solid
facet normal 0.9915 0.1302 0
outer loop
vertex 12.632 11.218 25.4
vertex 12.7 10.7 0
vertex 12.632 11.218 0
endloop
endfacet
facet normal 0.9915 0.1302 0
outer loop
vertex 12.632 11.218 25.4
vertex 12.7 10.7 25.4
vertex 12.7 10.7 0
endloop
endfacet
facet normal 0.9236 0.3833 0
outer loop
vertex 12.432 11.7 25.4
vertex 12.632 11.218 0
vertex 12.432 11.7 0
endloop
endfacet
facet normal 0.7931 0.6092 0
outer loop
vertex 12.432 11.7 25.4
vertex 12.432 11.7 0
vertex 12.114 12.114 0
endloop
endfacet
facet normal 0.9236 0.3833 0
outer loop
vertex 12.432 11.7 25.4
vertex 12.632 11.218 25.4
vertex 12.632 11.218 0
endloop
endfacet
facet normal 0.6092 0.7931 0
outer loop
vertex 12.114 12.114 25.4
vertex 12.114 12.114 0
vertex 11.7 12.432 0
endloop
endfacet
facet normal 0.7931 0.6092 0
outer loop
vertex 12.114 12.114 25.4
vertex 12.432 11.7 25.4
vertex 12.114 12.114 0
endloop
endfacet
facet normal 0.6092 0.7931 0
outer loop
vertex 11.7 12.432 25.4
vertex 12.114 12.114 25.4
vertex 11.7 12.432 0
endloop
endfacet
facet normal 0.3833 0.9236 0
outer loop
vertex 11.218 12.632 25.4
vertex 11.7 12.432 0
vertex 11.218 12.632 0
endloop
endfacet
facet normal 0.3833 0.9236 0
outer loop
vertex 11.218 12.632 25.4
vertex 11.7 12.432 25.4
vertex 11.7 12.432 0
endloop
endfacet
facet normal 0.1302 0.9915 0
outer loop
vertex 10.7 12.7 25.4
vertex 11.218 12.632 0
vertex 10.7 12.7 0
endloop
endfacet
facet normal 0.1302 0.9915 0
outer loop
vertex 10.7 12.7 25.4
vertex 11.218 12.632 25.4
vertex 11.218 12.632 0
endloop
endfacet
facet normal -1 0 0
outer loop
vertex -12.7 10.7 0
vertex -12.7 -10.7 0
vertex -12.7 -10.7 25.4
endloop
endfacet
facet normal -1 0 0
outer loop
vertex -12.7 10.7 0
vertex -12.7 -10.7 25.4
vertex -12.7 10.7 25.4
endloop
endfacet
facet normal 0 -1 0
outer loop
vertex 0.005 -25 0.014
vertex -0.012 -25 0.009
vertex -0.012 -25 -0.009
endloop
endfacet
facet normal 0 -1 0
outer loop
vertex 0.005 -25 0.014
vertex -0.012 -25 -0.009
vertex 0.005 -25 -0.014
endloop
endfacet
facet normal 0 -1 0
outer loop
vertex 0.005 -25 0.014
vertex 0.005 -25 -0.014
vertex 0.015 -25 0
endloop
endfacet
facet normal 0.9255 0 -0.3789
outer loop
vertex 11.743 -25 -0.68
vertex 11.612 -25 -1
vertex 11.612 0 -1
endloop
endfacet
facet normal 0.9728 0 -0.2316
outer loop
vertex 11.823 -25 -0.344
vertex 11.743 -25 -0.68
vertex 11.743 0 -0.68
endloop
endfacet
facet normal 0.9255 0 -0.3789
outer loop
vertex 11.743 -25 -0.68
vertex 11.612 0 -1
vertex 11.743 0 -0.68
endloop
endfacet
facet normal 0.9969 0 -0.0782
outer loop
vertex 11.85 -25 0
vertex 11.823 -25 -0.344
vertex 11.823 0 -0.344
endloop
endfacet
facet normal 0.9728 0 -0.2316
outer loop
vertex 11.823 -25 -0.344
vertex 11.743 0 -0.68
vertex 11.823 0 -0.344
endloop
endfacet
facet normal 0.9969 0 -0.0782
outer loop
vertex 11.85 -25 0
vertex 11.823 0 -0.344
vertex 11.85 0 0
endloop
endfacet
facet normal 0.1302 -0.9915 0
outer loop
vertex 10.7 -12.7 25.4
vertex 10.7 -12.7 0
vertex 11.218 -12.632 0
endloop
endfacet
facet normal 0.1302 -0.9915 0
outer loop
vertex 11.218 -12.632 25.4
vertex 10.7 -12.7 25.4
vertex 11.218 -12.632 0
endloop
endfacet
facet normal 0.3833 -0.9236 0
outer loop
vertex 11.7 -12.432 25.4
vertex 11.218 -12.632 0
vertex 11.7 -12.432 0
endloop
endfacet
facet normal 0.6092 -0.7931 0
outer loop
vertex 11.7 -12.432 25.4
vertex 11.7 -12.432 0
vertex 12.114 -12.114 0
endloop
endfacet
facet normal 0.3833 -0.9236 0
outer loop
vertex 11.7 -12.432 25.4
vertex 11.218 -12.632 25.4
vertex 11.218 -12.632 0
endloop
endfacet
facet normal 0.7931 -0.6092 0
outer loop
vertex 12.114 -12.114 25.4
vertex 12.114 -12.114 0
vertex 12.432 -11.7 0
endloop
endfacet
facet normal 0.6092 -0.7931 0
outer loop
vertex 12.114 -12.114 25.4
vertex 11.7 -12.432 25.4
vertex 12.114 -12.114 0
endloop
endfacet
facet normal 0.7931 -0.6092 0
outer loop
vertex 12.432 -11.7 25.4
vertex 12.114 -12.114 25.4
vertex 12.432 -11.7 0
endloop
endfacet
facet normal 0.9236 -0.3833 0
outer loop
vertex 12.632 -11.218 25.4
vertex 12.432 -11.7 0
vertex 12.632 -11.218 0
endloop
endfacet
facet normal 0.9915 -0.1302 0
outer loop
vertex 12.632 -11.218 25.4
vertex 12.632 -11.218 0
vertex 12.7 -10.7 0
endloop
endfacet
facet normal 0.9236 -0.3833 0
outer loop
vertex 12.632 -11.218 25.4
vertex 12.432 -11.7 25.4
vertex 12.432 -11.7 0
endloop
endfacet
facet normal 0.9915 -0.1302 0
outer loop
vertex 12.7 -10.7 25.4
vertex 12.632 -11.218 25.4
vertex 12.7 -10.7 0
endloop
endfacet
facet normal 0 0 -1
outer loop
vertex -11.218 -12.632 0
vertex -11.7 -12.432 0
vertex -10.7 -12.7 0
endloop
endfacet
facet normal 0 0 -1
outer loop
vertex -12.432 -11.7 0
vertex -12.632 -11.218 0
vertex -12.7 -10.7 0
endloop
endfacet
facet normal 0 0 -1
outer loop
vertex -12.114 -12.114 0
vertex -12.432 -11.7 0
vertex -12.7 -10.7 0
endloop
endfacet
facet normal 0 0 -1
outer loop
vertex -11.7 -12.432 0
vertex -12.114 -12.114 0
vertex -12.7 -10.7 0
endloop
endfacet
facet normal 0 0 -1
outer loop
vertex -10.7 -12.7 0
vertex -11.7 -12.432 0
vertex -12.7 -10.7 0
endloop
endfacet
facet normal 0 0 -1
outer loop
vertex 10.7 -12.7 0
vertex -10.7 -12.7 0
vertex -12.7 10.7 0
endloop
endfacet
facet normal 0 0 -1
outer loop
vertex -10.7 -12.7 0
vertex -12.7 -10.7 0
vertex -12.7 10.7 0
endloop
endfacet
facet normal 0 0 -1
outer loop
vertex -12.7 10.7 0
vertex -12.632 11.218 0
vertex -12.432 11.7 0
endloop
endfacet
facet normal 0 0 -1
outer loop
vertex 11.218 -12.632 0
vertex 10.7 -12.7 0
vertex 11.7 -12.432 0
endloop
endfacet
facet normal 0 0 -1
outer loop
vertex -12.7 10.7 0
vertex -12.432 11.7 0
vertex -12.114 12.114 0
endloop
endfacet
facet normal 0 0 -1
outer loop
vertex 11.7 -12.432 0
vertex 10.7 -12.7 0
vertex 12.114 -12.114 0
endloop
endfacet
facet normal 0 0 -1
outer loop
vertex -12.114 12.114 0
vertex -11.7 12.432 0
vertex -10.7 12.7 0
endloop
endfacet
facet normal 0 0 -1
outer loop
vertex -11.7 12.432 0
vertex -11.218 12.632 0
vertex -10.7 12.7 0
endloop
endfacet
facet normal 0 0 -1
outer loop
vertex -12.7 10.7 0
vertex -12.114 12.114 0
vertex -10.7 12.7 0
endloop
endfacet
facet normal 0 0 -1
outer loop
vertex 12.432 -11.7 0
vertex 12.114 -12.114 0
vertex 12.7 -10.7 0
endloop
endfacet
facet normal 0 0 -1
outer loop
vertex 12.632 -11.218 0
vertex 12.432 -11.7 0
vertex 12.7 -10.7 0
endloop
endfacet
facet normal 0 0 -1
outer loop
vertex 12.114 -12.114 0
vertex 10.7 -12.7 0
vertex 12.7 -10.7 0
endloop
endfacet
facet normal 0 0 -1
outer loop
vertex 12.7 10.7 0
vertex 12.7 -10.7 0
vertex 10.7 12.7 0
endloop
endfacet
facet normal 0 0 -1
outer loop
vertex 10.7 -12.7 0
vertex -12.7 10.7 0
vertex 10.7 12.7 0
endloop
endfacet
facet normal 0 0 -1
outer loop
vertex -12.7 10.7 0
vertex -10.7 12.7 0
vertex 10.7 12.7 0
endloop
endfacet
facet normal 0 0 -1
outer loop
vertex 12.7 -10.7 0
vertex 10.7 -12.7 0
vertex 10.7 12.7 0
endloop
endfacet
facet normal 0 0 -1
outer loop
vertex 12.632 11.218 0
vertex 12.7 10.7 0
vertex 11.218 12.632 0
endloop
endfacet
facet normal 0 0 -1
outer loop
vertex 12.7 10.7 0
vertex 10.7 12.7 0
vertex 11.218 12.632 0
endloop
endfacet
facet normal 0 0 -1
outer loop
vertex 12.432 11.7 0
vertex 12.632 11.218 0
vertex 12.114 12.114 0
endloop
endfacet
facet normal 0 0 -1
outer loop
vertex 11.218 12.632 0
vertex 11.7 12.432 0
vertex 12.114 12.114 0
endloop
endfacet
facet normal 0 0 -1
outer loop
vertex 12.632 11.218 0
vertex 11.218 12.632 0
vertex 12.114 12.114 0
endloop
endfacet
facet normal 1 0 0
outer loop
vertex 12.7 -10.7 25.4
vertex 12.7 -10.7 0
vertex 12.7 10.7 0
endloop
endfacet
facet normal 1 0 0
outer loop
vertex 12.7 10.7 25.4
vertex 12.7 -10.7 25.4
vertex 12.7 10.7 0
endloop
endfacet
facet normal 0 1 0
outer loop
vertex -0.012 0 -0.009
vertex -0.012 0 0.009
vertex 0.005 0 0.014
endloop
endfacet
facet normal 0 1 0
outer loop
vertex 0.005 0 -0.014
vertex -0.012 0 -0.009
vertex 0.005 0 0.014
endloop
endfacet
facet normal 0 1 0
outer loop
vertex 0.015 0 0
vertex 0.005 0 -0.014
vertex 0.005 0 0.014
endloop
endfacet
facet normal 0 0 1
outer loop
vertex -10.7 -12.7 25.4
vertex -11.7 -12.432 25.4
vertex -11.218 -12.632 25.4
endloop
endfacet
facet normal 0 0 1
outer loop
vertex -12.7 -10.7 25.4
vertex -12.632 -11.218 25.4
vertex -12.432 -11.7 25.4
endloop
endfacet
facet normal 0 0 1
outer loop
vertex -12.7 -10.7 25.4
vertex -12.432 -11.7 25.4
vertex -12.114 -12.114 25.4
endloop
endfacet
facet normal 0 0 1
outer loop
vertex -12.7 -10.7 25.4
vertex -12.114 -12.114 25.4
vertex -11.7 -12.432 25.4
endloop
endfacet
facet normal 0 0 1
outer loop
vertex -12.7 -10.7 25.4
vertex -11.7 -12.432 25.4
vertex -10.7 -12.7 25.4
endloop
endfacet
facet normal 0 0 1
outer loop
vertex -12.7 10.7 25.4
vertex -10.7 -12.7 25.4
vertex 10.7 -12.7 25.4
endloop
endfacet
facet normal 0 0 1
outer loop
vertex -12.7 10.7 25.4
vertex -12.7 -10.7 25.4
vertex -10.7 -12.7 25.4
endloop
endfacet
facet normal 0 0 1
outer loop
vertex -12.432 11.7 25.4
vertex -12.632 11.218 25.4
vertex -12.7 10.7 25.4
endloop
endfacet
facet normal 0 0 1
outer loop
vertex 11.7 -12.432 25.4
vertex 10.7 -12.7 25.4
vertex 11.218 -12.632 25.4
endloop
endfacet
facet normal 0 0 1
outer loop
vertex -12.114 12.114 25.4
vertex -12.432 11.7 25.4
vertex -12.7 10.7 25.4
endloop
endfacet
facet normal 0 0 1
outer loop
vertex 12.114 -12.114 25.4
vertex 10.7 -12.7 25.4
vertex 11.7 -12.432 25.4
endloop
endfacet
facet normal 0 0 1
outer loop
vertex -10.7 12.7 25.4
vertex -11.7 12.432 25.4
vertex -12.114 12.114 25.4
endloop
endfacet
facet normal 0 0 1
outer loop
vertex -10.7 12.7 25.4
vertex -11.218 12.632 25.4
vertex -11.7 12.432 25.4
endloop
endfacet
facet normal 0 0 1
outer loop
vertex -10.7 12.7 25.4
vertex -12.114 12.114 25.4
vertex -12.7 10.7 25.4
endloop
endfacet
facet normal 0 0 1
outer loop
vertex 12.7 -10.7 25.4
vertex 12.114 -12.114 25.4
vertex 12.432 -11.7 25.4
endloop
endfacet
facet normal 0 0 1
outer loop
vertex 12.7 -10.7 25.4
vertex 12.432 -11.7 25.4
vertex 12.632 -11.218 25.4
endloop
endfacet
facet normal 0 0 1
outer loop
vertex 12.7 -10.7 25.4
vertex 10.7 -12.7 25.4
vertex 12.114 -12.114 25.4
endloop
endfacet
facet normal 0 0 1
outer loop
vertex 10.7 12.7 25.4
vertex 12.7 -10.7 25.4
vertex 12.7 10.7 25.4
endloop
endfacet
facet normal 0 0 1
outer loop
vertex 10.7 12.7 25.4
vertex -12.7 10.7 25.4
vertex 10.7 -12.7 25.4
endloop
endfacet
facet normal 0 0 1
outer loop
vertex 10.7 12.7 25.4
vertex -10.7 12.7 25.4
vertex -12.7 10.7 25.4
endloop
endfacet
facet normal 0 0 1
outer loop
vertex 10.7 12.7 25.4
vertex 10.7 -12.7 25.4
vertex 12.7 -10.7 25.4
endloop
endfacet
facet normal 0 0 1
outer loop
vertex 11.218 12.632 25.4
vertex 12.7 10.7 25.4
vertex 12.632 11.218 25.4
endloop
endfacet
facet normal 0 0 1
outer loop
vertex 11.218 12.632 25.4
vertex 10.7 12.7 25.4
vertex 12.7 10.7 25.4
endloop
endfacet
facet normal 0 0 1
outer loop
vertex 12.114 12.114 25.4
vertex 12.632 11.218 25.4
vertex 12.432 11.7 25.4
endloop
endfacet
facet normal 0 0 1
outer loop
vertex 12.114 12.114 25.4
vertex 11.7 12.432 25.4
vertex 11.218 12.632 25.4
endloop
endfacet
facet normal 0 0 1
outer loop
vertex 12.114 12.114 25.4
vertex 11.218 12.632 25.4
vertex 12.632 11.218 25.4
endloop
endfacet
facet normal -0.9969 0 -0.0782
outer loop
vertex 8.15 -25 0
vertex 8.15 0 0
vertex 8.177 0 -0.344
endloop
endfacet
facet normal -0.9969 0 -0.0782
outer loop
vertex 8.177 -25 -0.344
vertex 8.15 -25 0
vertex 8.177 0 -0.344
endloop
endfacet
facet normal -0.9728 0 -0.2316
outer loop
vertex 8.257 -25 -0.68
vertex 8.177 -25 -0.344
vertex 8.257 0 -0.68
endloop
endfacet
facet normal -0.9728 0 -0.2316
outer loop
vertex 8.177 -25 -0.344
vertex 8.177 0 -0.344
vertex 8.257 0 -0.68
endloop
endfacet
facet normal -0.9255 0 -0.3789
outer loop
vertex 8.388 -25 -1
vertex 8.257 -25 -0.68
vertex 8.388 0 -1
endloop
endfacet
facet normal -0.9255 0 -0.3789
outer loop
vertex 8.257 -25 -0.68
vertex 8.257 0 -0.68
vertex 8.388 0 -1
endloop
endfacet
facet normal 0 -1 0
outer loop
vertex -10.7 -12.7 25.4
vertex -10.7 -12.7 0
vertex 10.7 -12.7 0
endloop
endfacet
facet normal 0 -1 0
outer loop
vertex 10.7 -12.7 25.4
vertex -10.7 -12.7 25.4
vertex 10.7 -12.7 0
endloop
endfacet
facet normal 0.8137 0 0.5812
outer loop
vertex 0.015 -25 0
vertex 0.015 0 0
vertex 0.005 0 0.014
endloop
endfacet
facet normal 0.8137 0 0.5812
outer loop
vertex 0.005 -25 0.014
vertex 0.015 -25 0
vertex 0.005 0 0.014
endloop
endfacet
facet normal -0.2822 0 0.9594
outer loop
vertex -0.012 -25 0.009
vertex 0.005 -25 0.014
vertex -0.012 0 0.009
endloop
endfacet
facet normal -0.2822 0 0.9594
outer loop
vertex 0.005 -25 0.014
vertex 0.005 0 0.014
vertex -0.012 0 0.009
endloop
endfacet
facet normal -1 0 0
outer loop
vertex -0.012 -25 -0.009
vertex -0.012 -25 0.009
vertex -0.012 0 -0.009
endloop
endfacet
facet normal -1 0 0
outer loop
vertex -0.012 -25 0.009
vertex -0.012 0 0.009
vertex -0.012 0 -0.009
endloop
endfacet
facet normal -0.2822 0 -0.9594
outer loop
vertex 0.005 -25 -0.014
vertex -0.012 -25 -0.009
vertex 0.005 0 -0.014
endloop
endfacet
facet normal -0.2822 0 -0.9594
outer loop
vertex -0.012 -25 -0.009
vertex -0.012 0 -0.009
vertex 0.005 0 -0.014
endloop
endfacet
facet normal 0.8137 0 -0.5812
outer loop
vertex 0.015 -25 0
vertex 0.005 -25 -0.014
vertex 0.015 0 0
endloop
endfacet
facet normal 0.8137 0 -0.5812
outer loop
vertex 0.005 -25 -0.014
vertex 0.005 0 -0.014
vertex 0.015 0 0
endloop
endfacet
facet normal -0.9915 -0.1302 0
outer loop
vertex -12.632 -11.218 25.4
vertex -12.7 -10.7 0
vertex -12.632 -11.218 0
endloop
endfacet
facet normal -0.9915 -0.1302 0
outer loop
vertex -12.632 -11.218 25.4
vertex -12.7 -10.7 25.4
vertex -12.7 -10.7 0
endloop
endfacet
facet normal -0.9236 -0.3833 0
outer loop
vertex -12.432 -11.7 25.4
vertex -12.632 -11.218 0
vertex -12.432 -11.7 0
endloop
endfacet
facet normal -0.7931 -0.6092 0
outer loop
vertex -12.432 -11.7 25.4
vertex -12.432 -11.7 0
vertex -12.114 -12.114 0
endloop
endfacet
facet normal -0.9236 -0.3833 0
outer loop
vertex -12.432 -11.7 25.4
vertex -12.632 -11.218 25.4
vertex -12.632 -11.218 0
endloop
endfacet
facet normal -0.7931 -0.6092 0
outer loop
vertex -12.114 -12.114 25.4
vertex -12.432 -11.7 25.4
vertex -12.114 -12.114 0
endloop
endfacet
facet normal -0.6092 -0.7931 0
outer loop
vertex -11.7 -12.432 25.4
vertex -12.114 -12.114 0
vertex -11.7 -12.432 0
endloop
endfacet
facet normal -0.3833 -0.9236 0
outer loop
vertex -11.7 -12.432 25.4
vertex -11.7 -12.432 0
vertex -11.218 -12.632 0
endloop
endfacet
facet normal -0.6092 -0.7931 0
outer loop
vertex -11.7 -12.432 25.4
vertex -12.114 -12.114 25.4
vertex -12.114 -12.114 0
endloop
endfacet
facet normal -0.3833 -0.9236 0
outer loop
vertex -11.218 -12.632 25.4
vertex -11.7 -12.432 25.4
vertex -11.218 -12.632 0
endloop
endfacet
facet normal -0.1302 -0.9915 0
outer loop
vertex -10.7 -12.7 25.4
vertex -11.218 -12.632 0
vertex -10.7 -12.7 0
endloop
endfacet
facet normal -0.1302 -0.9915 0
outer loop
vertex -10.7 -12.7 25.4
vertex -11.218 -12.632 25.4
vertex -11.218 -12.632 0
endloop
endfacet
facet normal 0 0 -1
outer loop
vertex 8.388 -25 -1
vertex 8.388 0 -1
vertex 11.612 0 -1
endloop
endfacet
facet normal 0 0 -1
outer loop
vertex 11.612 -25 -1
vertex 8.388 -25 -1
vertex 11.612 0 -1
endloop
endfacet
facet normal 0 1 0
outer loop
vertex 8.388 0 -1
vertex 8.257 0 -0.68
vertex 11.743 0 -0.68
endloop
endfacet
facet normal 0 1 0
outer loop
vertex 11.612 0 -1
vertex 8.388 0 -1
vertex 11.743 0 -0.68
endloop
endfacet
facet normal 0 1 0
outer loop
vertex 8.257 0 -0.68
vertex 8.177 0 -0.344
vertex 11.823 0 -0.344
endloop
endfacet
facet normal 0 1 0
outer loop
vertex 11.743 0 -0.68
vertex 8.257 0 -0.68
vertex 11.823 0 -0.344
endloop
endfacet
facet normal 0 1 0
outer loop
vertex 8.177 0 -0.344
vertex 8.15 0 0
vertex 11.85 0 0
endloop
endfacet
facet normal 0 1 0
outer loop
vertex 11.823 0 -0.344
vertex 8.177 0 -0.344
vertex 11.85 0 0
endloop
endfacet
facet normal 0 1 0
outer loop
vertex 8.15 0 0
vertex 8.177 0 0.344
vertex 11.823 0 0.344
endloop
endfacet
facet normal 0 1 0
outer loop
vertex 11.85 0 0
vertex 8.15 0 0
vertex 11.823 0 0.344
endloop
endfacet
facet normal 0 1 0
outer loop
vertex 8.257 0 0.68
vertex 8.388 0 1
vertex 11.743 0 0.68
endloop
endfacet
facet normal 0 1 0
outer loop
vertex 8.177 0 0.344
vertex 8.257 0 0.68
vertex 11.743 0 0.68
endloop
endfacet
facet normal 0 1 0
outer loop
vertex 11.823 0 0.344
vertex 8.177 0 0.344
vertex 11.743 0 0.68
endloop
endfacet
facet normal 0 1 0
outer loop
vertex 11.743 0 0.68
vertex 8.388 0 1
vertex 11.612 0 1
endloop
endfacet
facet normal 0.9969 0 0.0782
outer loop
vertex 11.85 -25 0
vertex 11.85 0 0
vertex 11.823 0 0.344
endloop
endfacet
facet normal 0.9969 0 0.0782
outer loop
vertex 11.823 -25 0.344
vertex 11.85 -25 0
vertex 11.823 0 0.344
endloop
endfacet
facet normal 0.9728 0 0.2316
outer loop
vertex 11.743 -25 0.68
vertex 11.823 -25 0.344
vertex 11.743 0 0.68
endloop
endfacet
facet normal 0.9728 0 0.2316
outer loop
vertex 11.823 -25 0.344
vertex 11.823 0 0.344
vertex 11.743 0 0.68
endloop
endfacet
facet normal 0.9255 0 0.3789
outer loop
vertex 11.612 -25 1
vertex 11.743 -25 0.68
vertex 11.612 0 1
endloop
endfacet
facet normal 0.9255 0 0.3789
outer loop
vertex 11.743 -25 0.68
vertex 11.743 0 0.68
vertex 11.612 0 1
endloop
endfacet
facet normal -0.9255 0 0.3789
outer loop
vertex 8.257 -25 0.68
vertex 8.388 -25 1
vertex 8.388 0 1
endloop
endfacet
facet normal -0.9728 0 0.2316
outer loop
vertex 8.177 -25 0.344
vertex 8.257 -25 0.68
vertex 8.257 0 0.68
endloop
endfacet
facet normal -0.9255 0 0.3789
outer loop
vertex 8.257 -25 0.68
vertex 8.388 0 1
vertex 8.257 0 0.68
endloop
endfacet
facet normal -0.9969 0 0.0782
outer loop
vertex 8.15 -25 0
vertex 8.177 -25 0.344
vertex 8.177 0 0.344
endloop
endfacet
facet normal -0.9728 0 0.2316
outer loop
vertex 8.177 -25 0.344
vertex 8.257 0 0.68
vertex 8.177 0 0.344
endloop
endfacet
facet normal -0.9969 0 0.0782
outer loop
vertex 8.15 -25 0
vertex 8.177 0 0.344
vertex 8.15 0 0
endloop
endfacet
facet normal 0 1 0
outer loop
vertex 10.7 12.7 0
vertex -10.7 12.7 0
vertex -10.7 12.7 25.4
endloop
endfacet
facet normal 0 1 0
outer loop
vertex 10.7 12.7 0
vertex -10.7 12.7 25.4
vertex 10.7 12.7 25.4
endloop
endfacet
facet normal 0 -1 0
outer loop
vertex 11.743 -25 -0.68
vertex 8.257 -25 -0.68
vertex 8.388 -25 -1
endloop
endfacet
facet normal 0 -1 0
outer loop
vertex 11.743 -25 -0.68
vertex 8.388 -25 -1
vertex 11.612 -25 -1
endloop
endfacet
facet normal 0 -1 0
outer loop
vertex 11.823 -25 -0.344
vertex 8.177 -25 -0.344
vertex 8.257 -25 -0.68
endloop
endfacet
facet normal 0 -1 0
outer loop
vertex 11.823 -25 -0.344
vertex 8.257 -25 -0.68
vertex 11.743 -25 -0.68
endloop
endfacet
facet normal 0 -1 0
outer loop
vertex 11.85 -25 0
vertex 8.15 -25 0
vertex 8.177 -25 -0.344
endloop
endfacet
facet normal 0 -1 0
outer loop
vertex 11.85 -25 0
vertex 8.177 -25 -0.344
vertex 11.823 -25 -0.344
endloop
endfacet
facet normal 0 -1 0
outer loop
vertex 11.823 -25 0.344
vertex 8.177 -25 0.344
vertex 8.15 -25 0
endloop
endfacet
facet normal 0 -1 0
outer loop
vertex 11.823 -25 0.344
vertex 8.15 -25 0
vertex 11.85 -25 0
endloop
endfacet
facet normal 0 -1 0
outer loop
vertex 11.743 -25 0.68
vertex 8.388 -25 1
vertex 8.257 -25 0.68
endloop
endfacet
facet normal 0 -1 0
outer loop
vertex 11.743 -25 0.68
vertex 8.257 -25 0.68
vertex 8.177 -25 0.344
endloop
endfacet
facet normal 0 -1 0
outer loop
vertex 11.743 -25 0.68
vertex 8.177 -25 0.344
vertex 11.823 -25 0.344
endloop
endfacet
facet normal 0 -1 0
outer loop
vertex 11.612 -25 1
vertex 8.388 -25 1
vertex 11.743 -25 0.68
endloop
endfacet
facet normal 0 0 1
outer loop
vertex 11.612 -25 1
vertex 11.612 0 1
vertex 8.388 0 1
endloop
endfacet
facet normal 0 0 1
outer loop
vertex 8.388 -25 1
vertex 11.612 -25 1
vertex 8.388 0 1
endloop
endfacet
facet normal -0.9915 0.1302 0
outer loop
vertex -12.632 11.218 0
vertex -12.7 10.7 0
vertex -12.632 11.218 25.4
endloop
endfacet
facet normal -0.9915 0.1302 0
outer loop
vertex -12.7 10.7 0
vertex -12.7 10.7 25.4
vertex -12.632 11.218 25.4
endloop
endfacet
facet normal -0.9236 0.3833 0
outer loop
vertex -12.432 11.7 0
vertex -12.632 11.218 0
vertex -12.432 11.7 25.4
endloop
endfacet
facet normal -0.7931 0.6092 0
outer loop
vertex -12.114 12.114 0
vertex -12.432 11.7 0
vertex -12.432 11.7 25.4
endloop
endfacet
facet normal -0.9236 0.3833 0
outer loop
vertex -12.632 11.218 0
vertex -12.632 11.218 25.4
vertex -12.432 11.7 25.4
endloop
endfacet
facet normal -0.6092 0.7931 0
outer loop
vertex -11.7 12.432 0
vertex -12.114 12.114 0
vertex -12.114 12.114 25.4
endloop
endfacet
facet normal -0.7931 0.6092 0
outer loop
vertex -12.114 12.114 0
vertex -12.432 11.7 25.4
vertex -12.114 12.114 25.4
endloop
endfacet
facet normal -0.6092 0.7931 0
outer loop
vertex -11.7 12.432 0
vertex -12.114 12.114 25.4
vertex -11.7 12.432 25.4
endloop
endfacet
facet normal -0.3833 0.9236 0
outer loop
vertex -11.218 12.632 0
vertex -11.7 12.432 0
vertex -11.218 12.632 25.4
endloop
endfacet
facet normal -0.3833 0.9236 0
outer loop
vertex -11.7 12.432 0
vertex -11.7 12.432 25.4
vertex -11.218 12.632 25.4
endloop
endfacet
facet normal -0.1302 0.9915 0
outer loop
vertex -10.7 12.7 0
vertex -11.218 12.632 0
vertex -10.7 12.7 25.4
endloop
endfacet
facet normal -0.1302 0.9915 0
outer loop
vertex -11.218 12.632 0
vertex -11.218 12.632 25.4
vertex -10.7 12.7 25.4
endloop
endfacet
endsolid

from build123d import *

# Parameters (mm, degrees)
F0_W     = 25.4
F0_H     = 25.4
F1_DEPTH = 25.4
F2_R     = 2
F3_R     = 0.015
F4_DEPTH = 25
F6_DEPTH = 25


with BuildPart() as f1:
    # F0 (on Top) → F1 (new body)
    with BuildSketch(Plane.XY):
        Rectangle(F0_W, F0_H)
    extrude(amount=F1_DEPTH)

    # F2
    f2_edges = [f1.edges().sort_by_distance(p)[0] for p in [
        (-12.7, -12.7, 12.7),
        (12.7, -12.7, 12.7),
        (-12.7, 12.7, 12.7),
        (12.7, 12.7, 12.7),
    ]]
    fillet(f2_edges, radius=F2_R)


with BuildPart() as f4:
    # F3 (on Front) → F4 (new body)
    with BuildSketch(Plane.XZ):
        Circle(F3_R)
    extrude(amount=F4_DEPTH)


with BuildPart() as f6:
    # F5 (on Front) → F6 (new body)
    with BuildSketch(Plane.XZ):
        with BuildLine():
            Line((11.6119329601, 1), (8.3880670399, 1))
            ThreePointArc((8.3880670399, 1), (8.2103369688, 0.5139737142), (8.15, 0))
            ThreePointArc((8.15, 0), (8.2103369688, -0.5139737142), (8.3880670399, -1))
            Line((8.3880670399, -1), (11.6119329601, -1))
            ThreePointArc((11.6119329601, -1), (11.7896630312, -0.5139737142), (11.85, 0))
            ThreePointArc((11.85, 0), (11.7896630312, 0.5139737142), (11.6119329601, 1))
        make_face()
    extrude(amount=F6_DEPTH)


solid = Compound([f1.part, f4.part, f6.part])
